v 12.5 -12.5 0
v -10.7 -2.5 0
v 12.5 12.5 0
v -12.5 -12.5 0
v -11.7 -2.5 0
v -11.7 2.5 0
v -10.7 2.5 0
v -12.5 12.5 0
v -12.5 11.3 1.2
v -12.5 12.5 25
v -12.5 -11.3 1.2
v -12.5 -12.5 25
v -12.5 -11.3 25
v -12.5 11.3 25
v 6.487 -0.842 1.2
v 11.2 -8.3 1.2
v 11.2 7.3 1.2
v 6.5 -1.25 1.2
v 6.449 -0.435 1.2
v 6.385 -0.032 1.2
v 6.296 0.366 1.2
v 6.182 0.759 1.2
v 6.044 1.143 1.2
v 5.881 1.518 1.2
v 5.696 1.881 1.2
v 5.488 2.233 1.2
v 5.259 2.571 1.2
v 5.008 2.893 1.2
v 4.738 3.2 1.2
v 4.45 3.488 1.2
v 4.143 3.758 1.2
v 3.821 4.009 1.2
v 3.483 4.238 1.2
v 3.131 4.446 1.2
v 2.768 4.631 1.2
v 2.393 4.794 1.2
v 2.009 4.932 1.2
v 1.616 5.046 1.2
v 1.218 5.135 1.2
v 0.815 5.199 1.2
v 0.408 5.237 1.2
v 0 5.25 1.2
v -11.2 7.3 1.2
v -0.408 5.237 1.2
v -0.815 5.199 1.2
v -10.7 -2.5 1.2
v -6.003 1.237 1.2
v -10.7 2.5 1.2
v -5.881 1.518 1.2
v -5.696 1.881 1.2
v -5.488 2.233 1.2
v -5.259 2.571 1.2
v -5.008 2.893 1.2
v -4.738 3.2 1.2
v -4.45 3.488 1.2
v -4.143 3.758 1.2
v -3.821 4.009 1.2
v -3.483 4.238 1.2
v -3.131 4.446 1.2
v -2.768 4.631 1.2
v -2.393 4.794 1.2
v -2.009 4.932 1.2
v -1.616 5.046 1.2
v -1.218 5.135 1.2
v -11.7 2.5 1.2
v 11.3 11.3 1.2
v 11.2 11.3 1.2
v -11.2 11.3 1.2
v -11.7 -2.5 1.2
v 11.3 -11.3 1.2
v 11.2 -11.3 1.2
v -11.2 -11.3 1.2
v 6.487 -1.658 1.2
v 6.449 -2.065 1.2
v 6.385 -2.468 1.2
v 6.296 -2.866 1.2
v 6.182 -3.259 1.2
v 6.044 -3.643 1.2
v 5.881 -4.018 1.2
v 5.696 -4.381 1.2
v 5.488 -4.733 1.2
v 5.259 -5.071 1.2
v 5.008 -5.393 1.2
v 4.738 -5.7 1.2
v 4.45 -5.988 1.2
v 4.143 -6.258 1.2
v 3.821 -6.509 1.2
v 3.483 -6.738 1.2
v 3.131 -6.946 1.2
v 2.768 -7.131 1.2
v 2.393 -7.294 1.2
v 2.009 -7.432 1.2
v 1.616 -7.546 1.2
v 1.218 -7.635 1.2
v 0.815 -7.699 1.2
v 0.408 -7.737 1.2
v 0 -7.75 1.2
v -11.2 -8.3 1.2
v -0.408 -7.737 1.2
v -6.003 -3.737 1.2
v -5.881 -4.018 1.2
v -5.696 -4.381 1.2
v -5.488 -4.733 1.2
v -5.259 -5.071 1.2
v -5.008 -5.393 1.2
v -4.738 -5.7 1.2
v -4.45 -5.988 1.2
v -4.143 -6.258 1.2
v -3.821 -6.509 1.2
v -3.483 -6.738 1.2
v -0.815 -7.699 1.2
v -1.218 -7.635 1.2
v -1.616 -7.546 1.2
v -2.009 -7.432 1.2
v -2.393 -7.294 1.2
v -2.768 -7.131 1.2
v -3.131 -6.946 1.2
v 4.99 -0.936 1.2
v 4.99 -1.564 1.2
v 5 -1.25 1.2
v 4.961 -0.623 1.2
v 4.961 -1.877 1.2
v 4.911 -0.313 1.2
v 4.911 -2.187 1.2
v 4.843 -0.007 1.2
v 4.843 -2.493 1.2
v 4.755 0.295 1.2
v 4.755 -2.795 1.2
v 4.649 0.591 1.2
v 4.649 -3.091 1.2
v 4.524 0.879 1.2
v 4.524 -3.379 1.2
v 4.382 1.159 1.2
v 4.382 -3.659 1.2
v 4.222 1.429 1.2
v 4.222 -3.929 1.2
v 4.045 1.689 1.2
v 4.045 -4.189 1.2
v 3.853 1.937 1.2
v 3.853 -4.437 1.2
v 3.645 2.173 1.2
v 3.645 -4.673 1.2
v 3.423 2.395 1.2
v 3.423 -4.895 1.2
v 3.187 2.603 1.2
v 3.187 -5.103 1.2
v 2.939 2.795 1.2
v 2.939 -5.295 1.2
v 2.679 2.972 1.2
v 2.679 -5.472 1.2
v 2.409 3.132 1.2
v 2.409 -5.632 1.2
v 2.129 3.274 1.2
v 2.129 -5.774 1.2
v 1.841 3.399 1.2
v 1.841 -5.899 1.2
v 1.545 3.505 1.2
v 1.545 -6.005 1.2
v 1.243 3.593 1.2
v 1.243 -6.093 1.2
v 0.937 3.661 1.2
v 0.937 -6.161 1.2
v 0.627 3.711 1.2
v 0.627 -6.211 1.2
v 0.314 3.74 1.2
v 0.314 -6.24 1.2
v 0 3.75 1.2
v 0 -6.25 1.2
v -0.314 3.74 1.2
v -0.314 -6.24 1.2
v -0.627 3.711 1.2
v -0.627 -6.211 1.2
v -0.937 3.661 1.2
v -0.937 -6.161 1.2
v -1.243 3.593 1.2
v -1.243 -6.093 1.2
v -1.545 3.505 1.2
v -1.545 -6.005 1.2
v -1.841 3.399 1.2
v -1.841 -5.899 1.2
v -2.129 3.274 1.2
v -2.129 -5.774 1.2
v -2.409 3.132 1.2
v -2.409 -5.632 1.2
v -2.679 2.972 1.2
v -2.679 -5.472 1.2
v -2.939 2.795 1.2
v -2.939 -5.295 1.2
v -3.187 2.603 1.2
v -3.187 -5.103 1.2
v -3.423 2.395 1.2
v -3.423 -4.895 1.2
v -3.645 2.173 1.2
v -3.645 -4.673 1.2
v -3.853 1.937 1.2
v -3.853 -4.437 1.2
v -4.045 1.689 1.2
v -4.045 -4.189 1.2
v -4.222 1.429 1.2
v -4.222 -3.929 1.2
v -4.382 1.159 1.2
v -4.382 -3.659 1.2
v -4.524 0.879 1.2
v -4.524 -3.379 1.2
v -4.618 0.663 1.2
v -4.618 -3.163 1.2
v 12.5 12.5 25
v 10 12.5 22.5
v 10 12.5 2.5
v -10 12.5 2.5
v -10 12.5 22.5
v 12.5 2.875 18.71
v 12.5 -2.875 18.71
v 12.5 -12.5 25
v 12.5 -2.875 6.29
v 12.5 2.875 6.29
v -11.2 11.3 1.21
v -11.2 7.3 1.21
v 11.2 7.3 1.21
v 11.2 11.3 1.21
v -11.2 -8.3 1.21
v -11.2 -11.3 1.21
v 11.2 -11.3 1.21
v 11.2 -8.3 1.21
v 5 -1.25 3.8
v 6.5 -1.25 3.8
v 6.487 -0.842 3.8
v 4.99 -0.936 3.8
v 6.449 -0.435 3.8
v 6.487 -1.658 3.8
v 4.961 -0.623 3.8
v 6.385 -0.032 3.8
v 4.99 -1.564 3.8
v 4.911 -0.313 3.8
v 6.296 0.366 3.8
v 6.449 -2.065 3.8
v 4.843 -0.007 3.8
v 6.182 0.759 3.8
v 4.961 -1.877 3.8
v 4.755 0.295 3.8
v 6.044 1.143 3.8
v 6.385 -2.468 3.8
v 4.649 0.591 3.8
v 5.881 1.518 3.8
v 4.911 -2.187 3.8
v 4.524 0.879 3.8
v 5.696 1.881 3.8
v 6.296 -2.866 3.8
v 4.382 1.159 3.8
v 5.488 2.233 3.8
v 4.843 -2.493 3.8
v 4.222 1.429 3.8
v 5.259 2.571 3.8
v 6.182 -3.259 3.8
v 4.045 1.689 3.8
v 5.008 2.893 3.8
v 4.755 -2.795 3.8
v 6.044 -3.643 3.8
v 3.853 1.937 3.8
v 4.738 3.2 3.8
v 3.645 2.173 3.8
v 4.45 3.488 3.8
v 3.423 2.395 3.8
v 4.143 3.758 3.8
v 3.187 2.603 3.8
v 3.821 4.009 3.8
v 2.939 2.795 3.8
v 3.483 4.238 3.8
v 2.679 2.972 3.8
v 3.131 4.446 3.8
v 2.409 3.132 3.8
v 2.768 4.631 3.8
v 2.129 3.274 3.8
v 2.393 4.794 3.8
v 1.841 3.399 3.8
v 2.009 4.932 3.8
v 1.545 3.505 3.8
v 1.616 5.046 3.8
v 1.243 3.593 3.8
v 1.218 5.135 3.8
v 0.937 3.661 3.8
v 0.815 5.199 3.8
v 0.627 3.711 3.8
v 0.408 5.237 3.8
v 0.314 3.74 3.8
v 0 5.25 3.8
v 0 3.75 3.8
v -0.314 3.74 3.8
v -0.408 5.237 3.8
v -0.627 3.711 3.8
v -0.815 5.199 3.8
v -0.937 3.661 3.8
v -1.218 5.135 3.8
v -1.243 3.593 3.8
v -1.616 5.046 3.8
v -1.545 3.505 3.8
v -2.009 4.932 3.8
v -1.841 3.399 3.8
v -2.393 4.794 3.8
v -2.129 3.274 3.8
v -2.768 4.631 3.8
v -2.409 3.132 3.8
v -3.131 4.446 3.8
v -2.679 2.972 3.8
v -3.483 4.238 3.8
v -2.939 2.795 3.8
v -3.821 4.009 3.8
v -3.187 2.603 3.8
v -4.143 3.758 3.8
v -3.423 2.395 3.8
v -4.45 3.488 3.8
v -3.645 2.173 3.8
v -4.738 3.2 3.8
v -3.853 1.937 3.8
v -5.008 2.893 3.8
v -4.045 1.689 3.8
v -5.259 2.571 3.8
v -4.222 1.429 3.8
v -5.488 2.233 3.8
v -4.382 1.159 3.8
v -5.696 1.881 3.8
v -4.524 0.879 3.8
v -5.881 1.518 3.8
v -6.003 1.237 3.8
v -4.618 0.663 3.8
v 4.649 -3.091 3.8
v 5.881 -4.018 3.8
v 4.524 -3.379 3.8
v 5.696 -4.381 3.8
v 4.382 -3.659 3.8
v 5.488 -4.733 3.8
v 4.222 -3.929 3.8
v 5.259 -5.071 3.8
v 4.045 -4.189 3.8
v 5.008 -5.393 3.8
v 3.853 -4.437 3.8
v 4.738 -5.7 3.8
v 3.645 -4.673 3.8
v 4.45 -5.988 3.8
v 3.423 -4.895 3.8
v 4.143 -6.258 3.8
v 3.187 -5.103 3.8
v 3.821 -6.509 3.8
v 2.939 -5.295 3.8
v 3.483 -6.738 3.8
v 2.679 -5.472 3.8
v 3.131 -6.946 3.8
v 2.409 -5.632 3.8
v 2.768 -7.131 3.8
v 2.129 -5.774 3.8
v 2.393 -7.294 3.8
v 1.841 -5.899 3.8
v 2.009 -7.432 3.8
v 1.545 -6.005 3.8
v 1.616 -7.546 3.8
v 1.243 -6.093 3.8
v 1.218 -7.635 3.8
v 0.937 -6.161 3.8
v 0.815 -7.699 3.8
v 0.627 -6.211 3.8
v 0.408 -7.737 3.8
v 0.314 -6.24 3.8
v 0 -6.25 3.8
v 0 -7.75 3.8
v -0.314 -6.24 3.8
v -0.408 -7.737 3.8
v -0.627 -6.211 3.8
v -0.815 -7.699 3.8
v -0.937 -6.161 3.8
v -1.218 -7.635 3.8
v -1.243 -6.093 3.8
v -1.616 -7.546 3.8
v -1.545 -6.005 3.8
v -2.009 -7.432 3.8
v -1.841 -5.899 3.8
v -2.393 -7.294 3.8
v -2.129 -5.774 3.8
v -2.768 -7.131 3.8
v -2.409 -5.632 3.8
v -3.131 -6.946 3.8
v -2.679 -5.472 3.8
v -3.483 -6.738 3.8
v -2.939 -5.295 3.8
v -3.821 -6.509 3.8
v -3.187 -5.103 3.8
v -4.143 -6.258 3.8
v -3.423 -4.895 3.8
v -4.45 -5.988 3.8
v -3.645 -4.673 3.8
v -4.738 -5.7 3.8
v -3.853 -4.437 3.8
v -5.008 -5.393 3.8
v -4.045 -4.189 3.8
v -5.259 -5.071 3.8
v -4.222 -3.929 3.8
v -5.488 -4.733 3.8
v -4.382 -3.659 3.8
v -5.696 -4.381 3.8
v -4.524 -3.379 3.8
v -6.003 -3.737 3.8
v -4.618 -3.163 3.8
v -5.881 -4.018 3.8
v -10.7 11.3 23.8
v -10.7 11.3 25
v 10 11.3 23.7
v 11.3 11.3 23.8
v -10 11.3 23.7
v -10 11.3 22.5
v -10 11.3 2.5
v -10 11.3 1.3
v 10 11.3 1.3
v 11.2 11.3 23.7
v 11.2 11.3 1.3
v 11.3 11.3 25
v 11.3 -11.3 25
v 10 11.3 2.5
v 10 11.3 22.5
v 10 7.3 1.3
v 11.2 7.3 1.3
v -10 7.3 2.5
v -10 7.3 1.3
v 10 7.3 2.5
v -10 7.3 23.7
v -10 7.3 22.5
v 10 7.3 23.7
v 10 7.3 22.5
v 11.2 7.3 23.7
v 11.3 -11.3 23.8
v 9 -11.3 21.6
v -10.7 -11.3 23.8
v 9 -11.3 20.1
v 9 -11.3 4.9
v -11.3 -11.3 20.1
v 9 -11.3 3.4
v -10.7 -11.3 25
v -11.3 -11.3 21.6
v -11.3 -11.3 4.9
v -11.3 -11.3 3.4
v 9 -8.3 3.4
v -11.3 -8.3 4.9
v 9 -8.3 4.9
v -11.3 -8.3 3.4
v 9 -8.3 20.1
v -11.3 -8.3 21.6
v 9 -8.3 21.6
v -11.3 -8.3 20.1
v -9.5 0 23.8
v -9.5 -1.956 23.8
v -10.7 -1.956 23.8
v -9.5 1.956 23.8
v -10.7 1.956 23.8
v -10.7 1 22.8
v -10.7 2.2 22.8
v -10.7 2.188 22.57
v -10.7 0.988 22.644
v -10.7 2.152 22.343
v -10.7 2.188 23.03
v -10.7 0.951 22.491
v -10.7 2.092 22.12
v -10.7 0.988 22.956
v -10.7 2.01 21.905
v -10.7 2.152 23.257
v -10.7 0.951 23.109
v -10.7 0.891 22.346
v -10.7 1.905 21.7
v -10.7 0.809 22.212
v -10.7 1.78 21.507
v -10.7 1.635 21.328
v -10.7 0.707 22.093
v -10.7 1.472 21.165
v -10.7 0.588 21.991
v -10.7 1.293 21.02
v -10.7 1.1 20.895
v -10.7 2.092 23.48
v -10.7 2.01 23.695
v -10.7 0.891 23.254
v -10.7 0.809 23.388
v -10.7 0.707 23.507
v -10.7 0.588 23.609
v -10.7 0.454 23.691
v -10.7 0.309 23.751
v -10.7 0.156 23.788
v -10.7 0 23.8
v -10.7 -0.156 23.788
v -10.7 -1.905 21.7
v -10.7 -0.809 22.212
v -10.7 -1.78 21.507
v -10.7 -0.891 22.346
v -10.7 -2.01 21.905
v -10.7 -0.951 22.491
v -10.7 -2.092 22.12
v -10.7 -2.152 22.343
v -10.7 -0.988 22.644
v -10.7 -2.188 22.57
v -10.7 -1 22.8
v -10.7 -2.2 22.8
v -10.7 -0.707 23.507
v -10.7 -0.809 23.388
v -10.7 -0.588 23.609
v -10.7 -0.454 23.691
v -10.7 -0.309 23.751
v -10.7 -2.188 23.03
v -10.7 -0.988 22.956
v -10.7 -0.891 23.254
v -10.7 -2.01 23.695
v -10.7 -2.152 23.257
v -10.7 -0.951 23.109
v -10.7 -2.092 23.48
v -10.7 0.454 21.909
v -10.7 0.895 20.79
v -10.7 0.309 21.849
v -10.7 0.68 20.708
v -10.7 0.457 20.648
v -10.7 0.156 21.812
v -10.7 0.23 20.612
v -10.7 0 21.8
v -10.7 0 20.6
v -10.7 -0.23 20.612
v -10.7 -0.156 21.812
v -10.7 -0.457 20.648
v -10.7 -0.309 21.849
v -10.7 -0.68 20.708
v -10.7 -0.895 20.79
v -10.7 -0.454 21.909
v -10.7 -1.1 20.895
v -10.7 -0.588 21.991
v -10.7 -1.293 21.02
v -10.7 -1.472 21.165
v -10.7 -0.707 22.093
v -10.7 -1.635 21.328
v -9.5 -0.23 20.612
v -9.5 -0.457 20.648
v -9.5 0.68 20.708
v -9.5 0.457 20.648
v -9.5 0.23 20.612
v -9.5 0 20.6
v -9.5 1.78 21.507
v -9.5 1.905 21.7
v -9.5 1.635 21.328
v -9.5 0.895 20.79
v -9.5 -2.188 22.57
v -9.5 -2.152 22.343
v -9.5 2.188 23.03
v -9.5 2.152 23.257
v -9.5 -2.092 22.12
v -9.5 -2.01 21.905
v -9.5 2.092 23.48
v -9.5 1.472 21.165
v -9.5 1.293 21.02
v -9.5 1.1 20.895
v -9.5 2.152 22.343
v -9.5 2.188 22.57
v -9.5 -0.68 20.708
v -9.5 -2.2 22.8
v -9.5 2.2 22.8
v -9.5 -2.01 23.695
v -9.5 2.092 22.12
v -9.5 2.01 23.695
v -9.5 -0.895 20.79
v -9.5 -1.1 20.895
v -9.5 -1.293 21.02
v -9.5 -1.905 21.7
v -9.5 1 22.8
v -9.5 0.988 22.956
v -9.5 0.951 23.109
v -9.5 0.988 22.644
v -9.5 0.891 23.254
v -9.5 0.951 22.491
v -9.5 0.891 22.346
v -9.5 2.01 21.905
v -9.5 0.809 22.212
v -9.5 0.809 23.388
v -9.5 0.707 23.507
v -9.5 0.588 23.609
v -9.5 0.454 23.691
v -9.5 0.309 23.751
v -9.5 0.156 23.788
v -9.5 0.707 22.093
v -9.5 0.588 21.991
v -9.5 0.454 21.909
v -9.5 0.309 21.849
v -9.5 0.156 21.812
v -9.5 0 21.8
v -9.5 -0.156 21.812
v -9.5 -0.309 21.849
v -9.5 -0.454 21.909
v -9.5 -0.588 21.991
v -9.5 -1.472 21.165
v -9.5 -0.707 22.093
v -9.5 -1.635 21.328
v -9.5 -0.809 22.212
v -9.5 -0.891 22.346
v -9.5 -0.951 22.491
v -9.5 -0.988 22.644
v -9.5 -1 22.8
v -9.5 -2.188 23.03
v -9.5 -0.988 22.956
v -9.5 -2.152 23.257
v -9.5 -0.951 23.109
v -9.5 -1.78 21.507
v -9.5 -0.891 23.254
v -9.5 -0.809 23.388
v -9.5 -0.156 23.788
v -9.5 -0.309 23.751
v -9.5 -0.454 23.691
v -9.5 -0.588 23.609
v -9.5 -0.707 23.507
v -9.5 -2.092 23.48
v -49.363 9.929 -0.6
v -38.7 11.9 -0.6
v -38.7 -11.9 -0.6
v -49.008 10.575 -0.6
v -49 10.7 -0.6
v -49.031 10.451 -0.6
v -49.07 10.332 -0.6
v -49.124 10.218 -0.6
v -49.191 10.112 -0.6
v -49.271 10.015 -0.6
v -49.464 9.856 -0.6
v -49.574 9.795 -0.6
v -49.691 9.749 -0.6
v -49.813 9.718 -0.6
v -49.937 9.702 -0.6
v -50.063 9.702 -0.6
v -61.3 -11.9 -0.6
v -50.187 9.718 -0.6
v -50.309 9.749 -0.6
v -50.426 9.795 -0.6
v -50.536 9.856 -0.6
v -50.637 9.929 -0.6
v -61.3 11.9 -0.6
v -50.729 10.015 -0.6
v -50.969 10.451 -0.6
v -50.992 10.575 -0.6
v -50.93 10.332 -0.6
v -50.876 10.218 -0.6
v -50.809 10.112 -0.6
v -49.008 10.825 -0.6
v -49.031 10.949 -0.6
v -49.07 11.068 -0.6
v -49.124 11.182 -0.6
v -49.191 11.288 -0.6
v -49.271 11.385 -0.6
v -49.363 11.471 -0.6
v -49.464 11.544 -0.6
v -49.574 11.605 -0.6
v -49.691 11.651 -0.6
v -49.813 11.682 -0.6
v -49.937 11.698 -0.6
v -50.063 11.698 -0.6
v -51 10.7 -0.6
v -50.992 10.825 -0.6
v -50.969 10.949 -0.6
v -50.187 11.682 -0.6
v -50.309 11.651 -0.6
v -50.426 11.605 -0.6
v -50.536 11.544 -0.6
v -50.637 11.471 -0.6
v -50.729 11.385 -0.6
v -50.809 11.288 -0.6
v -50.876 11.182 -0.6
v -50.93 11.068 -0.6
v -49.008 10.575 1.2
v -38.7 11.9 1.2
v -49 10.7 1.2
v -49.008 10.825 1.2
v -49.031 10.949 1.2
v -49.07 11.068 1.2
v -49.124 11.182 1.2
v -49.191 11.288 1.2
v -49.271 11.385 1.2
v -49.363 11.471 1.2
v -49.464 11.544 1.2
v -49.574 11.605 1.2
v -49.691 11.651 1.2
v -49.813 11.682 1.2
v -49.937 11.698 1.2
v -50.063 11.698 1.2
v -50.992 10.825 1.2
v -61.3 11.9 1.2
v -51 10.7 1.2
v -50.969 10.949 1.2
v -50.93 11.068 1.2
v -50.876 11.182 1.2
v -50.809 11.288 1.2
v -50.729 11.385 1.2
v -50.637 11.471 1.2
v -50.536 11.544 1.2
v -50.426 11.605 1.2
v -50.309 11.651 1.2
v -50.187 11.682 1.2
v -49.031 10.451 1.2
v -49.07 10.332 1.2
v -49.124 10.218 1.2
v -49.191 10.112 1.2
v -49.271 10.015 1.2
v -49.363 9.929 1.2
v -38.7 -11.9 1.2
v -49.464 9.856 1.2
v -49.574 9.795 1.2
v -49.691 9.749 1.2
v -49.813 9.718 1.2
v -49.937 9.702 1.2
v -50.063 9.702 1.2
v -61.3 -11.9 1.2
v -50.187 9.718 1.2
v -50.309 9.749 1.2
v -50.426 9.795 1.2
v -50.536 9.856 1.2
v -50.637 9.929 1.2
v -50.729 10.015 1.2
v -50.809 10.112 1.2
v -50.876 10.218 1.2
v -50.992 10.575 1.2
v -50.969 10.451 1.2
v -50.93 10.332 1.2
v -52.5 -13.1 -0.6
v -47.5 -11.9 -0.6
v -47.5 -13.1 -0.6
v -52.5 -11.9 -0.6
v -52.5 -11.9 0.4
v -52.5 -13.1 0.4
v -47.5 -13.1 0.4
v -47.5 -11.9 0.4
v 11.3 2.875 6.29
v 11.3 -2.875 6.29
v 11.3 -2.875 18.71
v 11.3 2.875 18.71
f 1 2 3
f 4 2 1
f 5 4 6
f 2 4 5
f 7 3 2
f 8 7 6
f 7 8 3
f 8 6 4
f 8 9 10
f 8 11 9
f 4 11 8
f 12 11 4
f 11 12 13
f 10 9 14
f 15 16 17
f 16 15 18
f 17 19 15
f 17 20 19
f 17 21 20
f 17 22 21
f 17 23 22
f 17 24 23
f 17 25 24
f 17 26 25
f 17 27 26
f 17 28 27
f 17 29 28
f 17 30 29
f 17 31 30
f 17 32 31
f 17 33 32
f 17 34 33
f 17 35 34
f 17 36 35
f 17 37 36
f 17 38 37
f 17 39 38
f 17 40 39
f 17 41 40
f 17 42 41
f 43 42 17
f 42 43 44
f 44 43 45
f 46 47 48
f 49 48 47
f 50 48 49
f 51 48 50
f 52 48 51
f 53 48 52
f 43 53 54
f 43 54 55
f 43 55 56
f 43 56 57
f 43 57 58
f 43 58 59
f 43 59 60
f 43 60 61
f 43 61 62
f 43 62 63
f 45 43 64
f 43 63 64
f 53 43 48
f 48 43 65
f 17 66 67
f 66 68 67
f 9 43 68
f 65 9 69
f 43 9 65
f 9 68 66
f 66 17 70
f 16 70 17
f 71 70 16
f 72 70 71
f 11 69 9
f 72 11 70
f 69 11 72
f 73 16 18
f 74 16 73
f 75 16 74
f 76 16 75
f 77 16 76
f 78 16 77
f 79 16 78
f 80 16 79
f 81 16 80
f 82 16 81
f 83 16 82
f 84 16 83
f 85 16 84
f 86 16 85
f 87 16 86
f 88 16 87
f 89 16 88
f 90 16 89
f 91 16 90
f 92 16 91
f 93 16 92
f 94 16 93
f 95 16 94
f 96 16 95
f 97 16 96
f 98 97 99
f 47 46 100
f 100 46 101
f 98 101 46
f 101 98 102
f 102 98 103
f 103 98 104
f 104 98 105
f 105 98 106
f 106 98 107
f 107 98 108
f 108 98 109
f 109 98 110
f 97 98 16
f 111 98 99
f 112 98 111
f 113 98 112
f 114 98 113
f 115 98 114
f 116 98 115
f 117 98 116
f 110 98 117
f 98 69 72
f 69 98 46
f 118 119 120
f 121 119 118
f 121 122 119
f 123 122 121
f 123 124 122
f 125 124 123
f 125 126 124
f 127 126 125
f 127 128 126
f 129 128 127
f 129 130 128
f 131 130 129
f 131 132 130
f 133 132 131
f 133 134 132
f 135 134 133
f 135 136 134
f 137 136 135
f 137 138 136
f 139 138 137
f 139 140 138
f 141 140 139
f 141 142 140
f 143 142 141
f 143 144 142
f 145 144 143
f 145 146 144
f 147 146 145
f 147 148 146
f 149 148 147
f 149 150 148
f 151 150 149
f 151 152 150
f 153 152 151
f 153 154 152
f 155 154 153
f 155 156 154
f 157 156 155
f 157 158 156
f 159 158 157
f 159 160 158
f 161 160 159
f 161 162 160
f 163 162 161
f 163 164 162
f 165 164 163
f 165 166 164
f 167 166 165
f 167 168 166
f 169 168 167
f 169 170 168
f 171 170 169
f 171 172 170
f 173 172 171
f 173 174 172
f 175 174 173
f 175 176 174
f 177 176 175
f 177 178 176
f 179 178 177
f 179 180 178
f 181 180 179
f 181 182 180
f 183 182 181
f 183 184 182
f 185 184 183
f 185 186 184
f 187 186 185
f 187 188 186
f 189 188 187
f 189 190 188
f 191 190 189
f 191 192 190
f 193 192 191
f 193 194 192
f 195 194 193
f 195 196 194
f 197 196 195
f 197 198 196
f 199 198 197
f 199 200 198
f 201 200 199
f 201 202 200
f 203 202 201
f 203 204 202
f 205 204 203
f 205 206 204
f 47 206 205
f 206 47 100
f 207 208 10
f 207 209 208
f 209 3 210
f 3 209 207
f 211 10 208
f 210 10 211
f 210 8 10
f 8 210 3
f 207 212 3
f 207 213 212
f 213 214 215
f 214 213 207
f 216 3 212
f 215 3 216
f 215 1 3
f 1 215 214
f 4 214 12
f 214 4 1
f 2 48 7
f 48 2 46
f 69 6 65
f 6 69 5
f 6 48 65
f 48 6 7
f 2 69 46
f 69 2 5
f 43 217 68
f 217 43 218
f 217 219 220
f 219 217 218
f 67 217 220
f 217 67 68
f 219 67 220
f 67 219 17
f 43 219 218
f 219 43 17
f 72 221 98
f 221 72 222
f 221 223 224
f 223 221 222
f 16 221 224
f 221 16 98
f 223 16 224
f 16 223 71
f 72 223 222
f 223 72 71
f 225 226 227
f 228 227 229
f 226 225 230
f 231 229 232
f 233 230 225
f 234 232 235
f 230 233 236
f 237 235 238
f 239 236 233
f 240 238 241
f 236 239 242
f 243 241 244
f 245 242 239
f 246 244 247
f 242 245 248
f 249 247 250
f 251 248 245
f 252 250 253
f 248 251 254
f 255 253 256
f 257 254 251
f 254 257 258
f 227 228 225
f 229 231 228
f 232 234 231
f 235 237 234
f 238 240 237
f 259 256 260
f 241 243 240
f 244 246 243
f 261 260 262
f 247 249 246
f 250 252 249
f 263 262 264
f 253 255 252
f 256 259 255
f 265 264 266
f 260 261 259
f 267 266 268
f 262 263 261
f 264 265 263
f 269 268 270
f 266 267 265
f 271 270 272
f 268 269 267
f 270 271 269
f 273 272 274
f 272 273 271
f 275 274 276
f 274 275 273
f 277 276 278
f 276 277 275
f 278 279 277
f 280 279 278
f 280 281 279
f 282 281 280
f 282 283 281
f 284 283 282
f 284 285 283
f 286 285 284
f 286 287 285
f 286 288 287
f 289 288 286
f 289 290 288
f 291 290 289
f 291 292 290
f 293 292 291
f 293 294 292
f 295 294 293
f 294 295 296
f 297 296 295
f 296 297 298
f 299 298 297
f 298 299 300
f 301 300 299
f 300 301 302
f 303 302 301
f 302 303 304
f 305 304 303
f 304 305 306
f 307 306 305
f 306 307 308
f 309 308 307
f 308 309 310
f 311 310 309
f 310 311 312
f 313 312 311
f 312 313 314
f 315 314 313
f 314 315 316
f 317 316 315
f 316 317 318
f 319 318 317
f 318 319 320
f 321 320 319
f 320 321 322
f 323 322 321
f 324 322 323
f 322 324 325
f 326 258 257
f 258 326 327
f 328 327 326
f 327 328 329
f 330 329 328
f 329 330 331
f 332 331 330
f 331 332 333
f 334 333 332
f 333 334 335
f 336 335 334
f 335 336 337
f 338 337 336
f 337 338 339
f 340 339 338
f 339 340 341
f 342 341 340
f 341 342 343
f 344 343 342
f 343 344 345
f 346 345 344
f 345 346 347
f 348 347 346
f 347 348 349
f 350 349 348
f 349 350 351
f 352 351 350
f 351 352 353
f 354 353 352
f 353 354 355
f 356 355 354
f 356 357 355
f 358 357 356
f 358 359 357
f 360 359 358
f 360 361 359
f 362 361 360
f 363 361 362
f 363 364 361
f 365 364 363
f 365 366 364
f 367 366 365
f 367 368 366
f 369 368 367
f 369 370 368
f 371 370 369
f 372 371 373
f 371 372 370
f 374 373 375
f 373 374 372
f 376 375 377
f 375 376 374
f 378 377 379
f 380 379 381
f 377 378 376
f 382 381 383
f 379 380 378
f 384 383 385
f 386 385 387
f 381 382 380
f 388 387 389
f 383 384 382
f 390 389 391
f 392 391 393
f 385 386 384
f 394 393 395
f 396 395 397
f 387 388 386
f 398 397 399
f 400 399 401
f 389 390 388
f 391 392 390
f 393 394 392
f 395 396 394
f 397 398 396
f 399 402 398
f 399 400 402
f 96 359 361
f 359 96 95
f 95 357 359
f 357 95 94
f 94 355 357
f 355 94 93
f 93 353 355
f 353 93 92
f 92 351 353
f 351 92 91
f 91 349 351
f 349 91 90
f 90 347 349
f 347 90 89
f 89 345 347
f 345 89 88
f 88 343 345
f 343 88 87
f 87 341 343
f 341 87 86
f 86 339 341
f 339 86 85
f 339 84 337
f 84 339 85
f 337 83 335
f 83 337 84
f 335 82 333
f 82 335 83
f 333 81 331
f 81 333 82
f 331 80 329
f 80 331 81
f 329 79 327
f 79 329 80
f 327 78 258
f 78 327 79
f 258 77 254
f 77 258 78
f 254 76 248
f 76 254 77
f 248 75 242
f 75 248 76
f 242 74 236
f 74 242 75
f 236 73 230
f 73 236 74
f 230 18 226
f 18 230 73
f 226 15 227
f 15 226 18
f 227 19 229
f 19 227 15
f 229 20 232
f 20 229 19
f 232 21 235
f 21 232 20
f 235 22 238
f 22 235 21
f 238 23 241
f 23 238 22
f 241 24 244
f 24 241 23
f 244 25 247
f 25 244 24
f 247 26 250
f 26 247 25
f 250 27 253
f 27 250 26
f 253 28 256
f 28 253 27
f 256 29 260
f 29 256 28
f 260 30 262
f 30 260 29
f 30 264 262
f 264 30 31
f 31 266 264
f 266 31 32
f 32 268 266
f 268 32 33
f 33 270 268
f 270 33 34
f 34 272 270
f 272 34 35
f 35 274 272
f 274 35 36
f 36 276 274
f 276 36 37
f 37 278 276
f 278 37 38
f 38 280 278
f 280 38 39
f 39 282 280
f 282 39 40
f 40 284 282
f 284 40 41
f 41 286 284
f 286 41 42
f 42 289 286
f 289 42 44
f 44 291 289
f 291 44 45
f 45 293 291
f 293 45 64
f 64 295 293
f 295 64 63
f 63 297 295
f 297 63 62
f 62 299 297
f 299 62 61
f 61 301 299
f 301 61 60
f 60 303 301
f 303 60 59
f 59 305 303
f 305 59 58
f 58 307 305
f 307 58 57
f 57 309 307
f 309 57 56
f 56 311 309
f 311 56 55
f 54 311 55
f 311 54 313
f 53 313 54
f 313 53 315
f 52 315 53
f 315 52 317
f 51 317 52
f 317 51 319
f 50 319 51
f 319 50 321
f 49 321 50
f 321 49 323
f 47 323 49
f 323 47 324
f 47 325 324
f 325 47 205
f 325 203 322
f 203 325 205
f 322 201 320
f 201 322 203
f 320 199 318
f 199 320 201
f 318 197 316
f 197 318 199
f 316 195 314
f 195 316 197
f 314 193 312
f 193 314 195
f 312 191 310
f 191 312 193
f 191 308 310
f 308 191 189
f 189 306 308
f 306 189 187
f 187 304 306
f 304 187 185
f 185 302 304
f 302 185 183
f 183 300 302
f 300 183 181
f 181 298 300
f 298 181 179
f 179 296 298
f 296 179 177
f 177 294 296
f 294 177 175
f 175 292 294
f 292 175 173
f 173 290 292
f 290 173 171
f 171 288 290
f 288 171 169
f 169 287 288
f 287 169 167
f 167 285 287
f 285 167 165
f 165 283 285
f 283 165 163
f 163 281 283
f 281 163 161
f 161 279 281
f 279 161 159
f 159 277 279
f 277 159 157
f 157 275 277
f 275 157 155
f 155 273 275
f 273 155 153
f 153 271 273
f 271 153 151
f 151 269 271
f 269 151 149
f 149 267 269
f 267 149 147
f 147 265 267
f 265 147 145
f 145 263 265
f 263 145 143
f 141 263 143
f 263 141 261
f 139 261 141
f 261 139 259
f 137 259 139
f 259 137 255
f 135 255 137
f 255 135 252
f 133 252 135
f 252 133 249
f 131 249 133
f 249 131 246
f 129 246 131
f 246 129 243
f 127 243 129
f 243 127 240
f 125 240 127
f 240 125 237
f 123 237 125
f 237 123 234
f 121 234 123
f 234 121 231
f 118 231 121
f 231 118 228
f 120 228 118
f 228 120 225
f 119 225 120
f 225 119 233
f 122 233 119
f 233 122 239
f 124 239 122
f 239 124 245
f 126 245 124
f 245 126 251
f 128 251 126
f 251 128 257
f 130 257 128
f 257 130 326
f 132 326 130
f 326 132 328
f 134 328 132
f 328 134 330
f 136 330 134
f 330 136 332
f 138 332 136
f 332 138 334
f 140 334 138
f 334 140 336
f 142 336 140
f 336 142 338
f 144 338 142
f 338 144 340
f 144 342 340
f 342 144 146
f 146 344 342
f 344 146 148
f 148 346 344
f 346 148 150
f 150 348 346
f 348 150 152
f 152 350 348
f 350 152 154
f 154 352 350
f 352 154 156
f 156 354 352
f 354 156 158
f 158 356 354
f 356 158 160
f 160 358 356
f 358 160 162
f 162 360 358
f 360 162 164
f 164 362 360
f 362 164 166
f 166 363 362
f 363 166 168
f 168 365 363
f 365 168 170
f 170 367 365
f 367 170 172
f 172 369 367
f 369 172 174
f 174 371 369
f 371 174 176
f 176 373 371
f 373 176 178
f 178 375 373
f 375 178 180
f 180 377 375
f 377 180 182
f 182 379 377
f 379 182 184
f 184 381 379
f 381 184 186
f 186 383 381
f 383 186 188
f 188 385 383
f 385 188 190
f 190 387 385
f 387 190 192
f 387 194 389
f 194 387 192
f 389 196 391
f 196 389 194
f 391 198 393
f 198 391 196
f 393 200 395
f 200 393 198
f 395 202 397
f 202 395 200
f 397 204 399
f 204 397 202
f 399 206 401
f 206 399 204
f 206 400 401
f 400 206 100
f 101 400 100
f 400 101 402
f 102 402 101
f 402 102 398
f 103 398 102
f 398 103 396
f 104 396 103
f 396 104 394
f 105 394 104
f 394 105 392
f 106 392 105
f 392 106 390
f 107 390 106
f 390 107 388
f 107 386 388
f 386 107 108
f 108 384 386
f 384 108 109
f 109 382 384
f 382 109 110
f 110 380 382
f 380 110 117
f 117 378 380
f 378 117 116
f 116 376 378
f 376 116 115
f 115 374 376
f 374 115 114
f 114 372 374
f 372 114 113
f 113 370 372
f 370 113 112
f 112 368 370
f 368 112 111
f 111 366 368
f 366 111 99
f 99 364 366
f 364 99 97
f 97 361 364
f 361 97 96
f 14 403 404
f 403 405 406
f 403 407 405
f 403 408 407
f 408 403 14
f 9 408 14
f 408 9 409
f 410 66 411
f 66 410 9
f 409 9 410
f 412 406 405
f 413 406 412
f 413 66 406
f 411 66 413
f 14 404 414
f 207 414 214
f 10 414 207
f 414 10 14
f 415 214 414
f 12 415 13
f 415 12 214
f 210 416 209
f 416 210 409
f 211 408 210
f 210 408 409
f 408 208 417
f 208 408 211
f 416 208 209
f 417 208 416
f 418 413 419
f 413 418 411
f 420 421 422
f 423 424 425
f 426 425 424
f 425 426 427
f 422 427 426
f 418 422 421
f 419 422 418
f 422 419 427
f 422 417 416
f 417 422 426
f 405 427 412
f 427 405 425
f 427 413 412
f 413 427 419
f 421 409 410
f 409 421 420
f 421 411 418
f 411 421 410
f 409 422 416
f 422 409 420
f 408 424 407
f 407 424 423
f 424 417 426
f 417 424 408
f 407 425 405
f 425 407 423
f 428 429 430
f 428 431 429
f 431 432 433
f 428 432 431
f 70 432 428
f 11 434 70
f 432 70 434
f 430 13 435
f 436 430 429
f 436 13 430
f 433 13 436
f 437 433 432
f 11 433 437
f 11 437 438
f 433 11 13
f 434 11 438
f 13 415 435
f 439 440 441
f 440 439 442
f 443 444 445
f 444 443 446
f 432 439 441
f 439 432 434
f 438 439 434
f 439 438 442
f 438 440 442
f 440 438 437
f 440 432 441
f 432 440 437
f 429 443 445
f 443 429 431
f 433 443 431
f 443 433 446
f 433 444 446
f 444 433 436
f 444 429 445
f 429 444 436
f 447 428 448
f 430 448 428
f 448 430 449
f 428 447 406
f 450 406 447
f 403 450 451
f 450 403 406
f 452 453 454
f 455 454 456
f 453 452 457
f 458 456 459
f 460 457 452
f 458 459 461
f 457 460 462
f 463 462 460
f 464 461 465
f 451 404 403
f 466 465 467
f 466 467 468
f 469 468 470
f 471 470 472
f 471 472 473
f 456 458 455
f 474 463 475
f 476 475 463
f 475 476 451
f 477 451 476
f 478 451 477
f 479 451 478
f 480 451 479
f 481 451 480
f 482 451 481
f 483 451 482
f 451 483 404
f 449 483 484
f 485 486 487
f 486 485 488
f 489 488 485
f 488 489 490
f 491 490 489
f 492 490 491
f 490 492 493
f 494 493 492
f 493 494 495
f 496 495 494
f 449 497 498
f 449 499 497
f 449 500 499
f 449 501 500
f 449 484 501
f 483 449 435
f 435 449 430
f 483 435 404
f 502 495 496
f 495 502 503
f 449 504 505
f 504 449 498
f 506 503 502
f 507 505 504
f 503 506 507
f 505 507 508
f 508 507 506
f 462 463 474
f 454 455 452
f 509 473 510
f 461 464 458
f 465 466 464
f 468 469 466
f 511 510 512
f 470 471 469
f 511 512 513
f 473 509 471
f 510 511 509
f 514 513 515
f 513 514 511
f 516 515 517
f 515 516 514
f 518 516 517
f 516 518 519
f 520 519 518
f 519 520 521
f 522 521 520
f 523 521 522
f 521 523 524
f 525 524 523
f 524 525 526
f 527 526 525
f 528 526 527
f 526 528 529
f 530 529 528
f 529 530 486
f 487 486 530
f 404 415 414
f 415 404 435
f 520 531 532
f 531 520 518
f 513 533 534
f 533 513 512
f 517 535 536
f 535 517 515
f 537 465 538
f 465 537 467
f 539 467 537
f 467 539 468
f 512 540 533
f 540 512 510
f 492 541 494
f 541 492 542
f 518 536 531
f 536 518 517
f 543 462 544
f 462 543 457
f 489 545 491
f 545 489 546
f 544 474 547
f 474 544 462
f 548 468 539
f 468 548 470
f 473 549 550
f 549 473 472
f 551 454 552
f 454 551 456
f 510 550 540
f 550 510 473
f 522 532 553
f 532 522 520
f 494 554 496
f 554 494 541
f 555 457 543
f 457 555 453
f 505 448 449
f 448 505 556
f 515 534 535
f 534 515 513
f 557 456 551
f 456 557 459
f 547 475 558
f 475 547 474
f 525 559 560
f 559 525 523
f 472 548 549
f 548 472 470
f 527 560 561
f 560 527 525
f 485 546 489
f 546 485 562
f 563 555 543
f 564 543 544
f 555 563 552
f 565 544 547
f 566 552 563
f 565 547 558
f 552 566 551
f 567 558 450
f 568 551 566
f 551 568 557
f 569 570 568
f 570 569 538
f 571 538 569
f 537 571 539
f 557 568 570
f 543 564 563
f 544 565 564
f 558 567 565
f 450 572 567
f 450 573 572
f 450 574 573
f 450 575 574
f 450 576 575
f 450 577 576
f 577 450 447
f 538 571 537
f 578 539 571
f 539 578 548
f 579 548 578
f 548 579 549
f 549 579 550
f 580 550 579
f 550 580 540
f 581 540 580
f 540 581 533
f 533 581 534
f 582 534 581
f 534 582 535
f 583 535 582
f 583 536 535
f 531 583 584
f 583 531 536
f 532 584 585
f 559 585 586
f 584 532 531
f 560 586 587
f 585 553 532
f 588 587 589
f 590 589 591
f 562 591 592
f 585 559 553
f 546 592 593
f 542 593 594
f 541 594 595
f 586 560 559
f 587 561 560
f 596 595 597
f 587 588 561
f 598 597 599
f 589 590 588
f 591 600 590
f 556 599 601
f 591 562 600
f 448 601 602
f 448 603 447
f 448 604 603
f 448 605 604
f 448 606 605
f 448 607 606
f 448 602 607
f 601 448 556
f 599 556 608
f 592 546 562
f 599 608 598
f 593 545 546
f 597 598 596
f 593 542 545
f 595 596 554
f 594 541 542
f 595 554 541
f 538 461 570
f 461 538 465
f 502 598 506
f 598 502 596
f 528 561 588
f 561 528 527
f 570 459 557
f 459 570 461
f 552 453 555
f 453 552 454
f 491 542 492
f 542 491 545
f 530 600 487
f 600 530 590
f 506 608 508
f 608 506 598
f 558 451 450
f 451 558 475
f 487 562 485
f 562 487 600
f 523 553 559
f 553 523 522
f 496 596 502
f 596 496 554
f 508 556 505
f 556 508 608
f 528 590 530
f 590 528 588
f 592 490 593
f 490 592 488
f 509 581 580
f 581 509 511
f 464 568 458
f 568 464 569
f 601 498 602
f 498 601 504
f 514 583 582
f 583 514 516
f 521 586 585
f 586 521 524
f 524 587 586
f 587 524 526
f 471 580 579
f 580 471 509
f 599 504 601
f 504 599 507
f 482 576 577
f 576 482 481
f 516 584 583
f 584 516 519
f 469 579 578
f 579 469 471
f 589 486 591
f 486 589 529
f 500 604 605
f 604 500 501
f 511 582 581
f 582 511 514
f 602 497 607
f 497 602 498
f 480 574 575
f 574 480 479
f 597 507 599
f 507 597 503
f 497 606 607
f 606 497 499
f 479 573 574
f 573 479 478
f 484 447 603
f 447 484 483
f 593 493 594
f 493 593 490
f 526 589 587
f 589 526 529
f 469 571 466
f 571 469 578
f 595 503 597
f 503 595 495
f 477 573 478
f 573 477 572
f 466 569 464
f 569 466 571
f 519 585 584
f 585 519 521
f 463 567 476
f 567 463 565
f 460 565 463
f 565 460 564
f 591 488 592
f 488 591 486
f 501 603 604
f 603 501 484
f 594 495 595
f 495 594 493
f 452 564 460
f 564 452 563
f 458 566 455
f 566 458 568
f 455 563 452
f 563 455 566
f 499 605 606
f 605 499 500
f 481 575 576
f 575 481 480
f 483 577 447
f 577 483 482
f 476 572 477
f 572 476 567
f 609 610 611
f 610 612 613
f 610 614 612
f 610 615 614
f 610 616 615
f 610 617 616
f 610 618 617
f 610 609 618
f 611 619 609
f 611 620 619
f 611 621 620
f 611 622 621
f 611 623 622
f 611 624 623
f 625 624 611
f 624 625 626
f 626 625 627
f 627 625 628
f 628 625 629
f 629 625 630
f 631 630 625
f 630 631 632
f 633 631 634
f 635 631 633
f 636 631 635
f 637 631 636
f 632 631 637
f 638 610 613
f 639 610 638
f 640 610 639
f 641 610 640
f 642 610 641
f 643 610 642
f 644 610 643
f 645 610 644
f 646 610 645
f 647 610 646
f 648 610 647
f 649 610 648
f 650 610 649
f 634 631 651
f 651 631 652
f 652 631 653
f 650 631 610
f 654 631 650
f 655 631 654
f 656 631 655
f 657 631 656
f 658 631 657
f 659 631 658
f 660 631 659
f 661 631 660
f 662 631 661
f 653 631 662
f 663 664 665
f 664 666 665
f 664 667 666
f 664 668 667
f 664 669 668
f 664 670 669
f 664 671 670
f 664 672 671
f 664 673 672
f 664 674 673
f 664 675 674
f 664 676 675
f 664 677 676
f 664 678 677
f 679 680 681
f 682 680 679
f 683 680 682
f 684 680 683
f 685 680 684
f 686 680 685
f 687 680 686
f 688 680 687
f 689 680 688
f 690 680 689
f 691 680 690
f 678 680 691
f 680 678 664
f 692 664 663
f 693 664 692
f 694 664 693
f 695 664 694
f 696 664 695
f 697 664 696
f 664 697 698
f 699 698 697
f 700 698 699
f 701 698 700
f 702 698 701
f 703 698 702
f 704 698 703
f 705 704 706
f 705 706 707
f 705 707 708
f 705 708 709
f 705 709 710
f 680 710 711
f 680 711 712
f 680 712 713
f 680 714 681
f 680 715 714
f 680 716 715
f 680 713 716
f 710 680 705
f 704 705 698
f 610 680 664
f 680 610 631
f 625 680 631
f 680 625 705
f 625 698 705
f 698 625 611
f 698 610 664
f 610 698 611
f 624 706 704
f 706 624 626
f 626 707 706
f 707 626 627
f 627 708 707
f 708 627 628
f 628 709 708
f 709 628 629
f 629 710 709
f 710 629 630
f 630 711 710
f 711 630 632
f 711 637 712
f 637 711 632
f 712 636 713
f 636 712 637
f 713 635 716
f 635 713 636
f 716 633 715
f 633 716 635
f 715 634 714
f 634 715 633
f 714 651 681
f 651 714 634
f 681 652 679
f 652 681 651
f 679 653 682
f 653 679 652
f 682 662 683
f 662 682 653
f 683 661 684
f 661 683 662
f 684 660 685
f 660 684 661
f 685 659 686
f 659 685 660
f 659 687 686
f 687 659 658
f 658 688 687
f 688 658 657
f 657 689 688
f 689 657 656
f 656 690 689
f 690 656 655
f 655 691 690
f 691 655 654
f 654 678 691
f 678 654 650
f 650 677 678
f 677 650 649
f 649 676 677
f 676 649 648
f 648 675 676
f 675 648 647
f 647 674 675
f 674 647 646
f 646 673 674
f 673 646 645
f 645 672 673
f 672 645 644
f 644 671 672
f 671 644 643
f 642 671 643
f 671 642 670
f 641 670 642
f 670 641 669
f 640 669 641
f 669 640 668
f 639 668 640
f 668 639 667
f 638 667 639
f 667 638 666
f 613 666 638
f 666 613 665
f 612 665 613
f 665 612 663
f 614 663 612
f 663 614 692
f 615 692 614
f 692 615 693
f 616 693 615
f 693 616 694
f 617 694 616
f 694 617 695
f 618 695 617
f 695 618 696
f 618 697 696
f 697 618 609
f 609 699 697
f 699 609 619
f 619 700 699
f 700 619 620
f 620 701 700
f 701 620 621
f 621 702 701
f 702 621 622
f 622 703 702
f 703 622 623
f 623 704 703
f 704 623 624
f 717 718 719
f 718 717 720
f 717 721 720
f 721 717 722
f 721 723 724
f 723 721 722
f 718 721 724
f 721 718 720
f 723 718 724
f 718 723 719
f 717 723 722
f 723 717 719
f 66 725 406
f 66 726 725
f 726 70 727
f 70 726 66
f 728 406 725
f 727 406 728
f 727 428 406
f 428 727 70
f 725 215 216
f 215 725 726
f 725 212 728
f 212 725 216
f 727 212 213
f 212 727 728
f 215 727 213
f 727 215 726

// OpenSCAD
// ============================================================
// 하우징 조립 - ERM 면 + Peltier 면
// ERM 면: 바닥 (XY 평면, world Z=0)
// Peltier 면: ERM 면의 +Y쪽 가장자리에서 수직으로 세움.
//   Peltier 면의 로컬 Y축(위<->아래) -> world Z축(위<->아래)
//   Peltier 면의 로컬 Z축(브라켓 돌출) -> world -Y축(하우징 안쪽으로 돌출)
// ============================================================

// ---------------- ERM 면 ----------------
module erm_face() {
    face_size      = 25;   // 면의 가로/세로 (정사각형)
    housing_t      = 1.2;  // 하우징 두께 (사방 테두리)
    border_gap     = 0.1;  // 테두리 안쪽 빈 공간 (Peltier 쪽 면과 동일한 규칙 적용)
    peltier_t      = 4;    // Peltier 고정 두께 (Z 깊이는 Peltier 면에서 결정)
    gap_1          = 2.05; // 빈 공간 (peltier_t 5.5->4 축소로 생긴 1.5mm를 ERM 링과 가까운 이 gap에 보충)
    erm_ring_t     = 1.5;  // ERM 고정 두께 (링 벽 두께)
    erm_hole_d     = 10;   // ERM 부품이 들어갈 원형 공간 지름
    gap_2          = 0.55; // 빈 공간 (ERM 링 두께 축소로 생긴 1mm 중 0.5mm 보충)
    motor_driver_t = 3;    // 모터 드라이버 고정 두께 (Z 깊이는 다른 면 설계 시 결정)

    erm_ring_z     = 2.6;  // ERM 고정 두께의 Z방향 깊이 (확정값)
    guide_h        = 0.01; // 참고용 2D 레이아웃 표시용 얇은 두께

    // --- Y축 경계 계산 (중심 원점, 위 -> 아래) ---
    y_top    = face_size / 2;
    y1 = y_top - housing_t;   // peltier 밴드 상단
    y2 = y1 - peltier_t;      // gap_1 상단
    y3 = y2 - gap_1;          // erm 링 위쪽 벽 상단
    y4 = y3 - erm_ring_t;     // erm 구멍 상단
    y5 = y4 - erm_hole_d;     // erm 구멍 하단 / 링 아래쪽 벽 상단
    y6 = y5 - erm_ring_t;     // gap_2 상단
    y7 = y6 - gap_2;          // 모터 드라이버 밴드 상단
    y8 = y7 - motor_driver_t; // 하우징 아래쪽 테두리 상단
    y_bottom = y8 - housing_t; // 검증용 (-face_size/2 와 같아야 함)

    erm_center_y = (y4 + y5) / 2;
    erm_inner_r  = erm_hole_d / 2;
    erm_outer_r  = erm_inner_r + erm_ring_t;

    frame_inner_w = face_size - 2 * housing_t;
    inner_w       = face_size - 2 * (housing_t + border_gap);

    echo("[ERM] y_bottom check =", y_bottom, " (should be", -face_size / 2, ")");
    echo("[ERM] ring center_y =", erm_center_y, " inner_r =", erm_inner_r, " outer_r =", erm_outer_r);

    // 하우징 바닥판 (면 전체, 실제 3D, 두께 1.2mm)
    // ERM 링이 뚫린 부분(9시 방향) 쪽, -X 가장자리에서 0.8mm 띄운 지점부터
    // (기존 0.2mm에서 ERM 링쪽으로 0.6mm 추가 이동)
    // 5mm(Y) x 1mm(X) 직사각형을 완전 관통(Z 1.2mm 전체). Y는 8.8mm씩 양쪽에서 띄워 중앙 정렬.
    color("gray")
        difference() {
            linear_extrude(height = housing_t)
                square([face_size, face_size], center = true);
            translate([-face_size / 2 + 0.8, -2.5, 0])
                cube([1, 5, housing_t]);
        }

    // 참고용 2D 레이아웃 (Z 깊이 미정 영역, 바닥판 위에 반투명 표시)
    color("orange", 0.3)
        translate([0, 0, housing_t])
            linear_extrude(height = guide_h)
                translate([0, y1 - peltier_t / 2])
                    square([inner_w, peltier_t], center = true);

    color("cyan", 0.3)
        translate([0, 0, housing_t])
            linear_extrude(height = guide_h)
                translate([0, y7 - motor_driver_t / 2])
                    square([inner_w, motor_driver_t], center = true);

    // ERM 링에서 잘라낼 구간: 9시 방향(180도) 기준 45도
    erm_gap_center_deg = 180;
    erm_gap_width_deg  = 45;
    erm_gap_r          = erm_outer_r + 1; // 확실히 잘리도록 여유

    // ERM 고정 링 (실제 3D, 바닥판 위에 Z 깊이 2.6mm 추가, 9시 방향 45도 절개)
    color("SteelBlue")
        translate([0, erm_center_y, housing_t])
            linear_extrude(height = erm_ring_z)
                difference() {
                    difference() {
                        circle(r = erm_outer_r, $fn = 100);
                        circle(r = erm_inner_r, $fn = 100);
                    }
                    polygon(points = [
                        [0, 0],
                        [erm_gap_r * cos(erm_gap_center_deg - erm_gap_width_deg / 2),
                         erm_gap_r * sin(erm_gap_center_deg - erm_gap_width_deg / 2)],
                        [erm_gap_r * cos(erm_gap_center_deg + erm_gap_width_deg / 2),
                         erm_gap_r * sin(erm_gap_center_deg + erm_gap_width_deg / 2)]
                    ]);
                }
}

// ---------------- Peltier 면 ----------------
module peltier_face() {
    face_size  = 25;   // 면의 가로/세로 (정사각형)
    housing_t  = 1.2;  // 하우징 두께 (사방 테두리)
    border_gap = 0.1;  // 테두리 안쪽 빈 공간 (X방향: 좌우 브라켓/연결부 폭 계산용)
    top_gap    = 1.3;  // 위쪽 테두리 - 브라켓 사이 Y방향 빈 공간 (bracket_h 1.2mm 축소분 보충: 0.1 -> 1.3)

    bracket_w  = 1.2;   // 세로 브라켓(Peltier 고정) 가로 두께
    bracket_h  = 20;    // 세로 브라켓(Peltier 고정) 세로 높이
    open_w     = 20;    // 브라켓 사이 뚫린 공간 가로 폭
    erm_link_h = 1.2;   // ERM 면과 연결되는 부분의 세로 두께 (브라켓과 바로 붙음)
    mid_gap    = 0.1;   // ERM 연결부 - 바깥 하우징 테두리 사이 빈 공간

    bracket_z  = 4;     // Peltier 고정 두께의 Z방향 깊이
    guide_h    = 0.01;  // 참고용 2D 레이아웃 표시용 얇은 두께

    frame_inner_w = face_size - 2 * housing_t;
    inner_w       = face_size - 2 * (housing_t + border_gap);

    // Y축 (위 -> 아래)
    y_top = face_size / 2;
    y1 = y_top - housing_t;
    y2 = y1 - top_gap;
    y3 = y2 - bracket_h;
    y4 = y3 - erm_link_h;
    y5 = y4 - mid_gap;
    y_bottom = y5 - housing_t;

    // X축 (왼쪽 -> 오른쪽)
    x_left = -face_size / 2;
    x1 = x_left + housing_t;
    x2 = x1 + border_gap;
    x3 = x2 + bracket_w;
    x4 = x3 + open_w;
    x5 = x4 + bracket_w;
    x_right_check = x5 + border_gap + housing_t;

    bracket_center_y = (y2 + y3) / 2;
    left_bracket_center_x  = (x2 + x3) / 2;
    right_bracket_center_x = (x4 + x5) / 2;

    echo("[Peltier] y_bottom check =", y_bottom, " (should be", -face_size / 2, ")");
    echo("[Peltier] x_right check =", x_right_check, " (should be", face_size / 2, ")");

    // 하우징 바닥판 (면 전체, 실제 3D, 두께 1.2mm)
    // 브라켓 자리(20mm x 20mm)를 관통 구멍으로 뚫음
    color("gray")
        difference() {
            linear_extrude(height = housing_t)
                square([face_size, face_size], center = true);
            translate([0, bracket_center_y, -0.1])
                linear_extrude(height = housing_t + 0.2)
                    square([open_w, bracket_h], center = true);
        }

    // ERM 연결부 (실제 3D, 바닥판 위에 Z 깊이 4mm 추가)
    color("green")
        translate([0, 0, housing_t])
            linear_extrude(height = bracket_z)
                translate([0, y3 - erm_link_h / 2])
                    square([inner_w, erm_link_h], center = true);

    // Peltier 고정 브라켓 (실제 3D, 바닥판 위에 Z 깊이 4mm 추가)
    color("SteelBlue")
        translate([0, 0, housing_t])
            linear_extrude(height = bracket_z) {
                translate([left_bracket_center_x, bracket_center_y])
                    square([bracket_w, bracket_h], center = true);
                translate([right_bracket_center_x, bracket_center_y])
                    square([bracket_w, bracket_h], center = true);
            }
}

// ---------------- 오른쪽(3시 방향) 면 ----------------
// 다른 부품 없이 1.2mm 두께 벽에 정가운데 직사각형 구멍만 있는 단순한 면.
module right_face() {
    face_size = 25;    // 면의 가로/세로 (정사각형, ERM/Peltier 면과 동일)
    housing_t = 1.2;   // 하우징 두께 (벽 두께)
    hole_w    = 12.42; // 정가운데 구멍 가로
    hole_h    = 5.75;  // 정가운데 구멍 세로

    color("gray")
        linear_extrude(height = housing_t)
            difference() {
                square([face_size, face_size], center = true);
                square([hole_w, hole_h], center = true);
            }
}

// ---------------- 모터 드라이버 쪽 면 ----------------
module motor_driver_face() {
    face_size = 25;   // 면의 가로/세로 (정사각형)
    housing_t = 1.2;  // 하우징 두께 (사방 테두리)

    gap_y     = 2.3;   // 위쪽 하우징 테두리 - 브라켓 사이 빈 공간
    bracket_h = 20.3;  // 세로 브라켓(모터 드라이버 고정) 세로 높이
    gap_x     = 2.2;   // 좌우 하우징 테두리 - 브라켓 사이 빈 공간
    bracket_w = 1.5;   // 세로 브라켓(모터 드라이버 고정) 가로 두께
    open_w    = 15.2;  // 브라켓 사이 뚫린 공간 가로 폭

    bracket_z = 3;     // 모터 드라이버 고정 두께의 Z방향 깊이 (ERM 면 스택의 3mm 재사용)

    // Y축 (위 -> 아래)
    y_top = face_size / 2;
    y1 = y_top - housing_t;
    y2 = y1 - gap_y;
    y3 = y2 - bracket_h;       // 브라켓 하단 = 아래쪽 테두리 상단 (ERM 연결)
    y_bottom = y3 - housing_t;

    // X축 (왼쪽 -> 오른쪽)
    x_left = -face_size / 2;
    x1 = x_left + housing_t;
    x2 = x1 + gap_x;
    x3 = x2 + bracket_w;
    x4 = x3 + open_w;
    x5 = x4 + bracket_w;
    x_right_check = x5 + gap_x + housing_t;

    bracket_center_y = (y2 + y3) / 2;
    left_bracket_center_x  = (x2 + x3) / 2;
    right_bracket_center_x = (x4 + x5) / 2;

    echo("[MotorDriver] y_bottom check =", y_bottom, " (should be", -face_size / 2, ")");
    echo("[MotorDriver] x_right check =", x_right_check, " (should be", face_size / 2, ")");

    // 하우징 바닥판 (면 전체, 실제 3D, 두께 1.2mm)
    color("gray")
        linear_extrude(height = housing_t)
            square([face_size, face_size], center = true);

    // 모터 드라이버 고정 브라켓 (실제 3D, 바닥판 위에 Z 깊이 3mm 추가)
    color("purple")
        translate([0, 0, housing_t])
            linear_extrude(height = bracket_z) {
                translate([left_bracket_center_x, bracket_center_y])
                    square([bracket_w, bracket_h], center = true);
                translate([right_bracket_center_x, bracket_center_y])
                    square([bracket_w, bracket_h], center = true);
            }
}

// ---------------- 조립 ----------------
erm_face();

// Peltier 면을 ERM 면의 +Y쪽 가장자리(y=12.5)에 수직으로 세움 (위치는 그대로).
// 면 안의 패턴(브라켓/연결부)만 왼쪽(반시계 방향)으로 90도 회전.
// 로컬 Y -> world Z, 로컬 Z(브라켓 돌출) -> world -Y
translate([0, 12.5, 12.5])
    rotate([90, 0, 0])
        rotate([0, 0, 90])
            peltier_face();

// 오른쪽 면을 ERM 면의 +X쪽 가장자리(x=12.5)에 수직으로 세움.
translate([12.5, 0, 12.5])
    rotate([0, -90, 0])
        right_face();

// 모터 드라이버 면을 ERM 면의 -Y쪽 가장자리(y=-12.5)에 수직으로 세움.
// Peltier 면과 같은 형태의 변환을 쓰고, world Z축 기준 180도 돌려서 반대쪽 가장자리에 배치.
// 면 안의 패턴(브라켓)만 제자리에서 90도 회전.
rotate([0, 0, 180])
    translate([0, 12.5, 12.5])
        rotate([90, 0, 0])
            rotate([0, 0, 90])
                motor_driver_face();

// ---------------- 윗면 ----------------
// 다른 부품 없이 1.2mm 두께 벽만 있는 단순한 면. 박스 맨 위(z=25)를 막음.
// 뚫린 면(-X쪽, 왼쪽) 방향으로 1.2mm 잘라내서 클로저 부품이 들어갈 자리를 남김.
// 클로저 하우징의 나사 구멍(윗면 안쪽 면 기준 Z로 1.2mm 아래)에 맞춰
// 지름 5mm 보스(가장자리에서 안쪽으로 1.5mm) 1개를 가운데에 붙이고, 나사 구멍은
// 클로저 구멍과 같은 방향(X축)으로 지름 2mm 관통.
module top_face() {
    face_size = 25;   // 면의 가로/세로 (정사각형)
    housing_t = 1.2;  // 하우징 두께 (벽 두께)

    boss_d      = 4.4;  // 나사 보스 지름
    boss_depth  = 1.2;  // 나사 보스의 X방향 두께
    boss_x0     = -face_size / 2 + housing_t; // 가장자리(뚫린 부분)에서 안쪽으로 1.2mm 들어간 원래 지점
    boss_shift  = 0.6;   // ERM 면의 직사각형 구멍과 동일하게 0.6mm 안쪽으로 이동
    boss_x      = boss_x0 + boss_shift;
    screw_d     = 2;    // 나사 구멍 지름
    boss_y      = 0;    // 가운데 정렬
    boss_z      = -1.0; // 보스 맨 위(Z) 좌표가 판재 맨 위(z=housing_t=1.2)와 같도록 설정 (-1.0+4.4/2=1.2)

    difference() {
        union() {
            // 판재 자체 길이를 보스 이동분(0.6mm)만큼 더 줄임 (뚫린 가장자리에서 housing_t+boss_shift만큼 후퇴)
            color("gray")
                linear_extrude(height = housing_t)
                    translate([-face_size / 2 + housing_t + boss_shift, -face_size / 2])
                        square([face_size - housing_t - boss_shift, face_size], center = false);

            // 나사 보스 1개 (0.6mm 이동한 지점부터 안쪽으로 1.5mm, 구멍 축은 X방향)
            color("gray")
                translate([boss_x, boss_y, boss_z])
                    rotate([0, 90, 0])
                        cylinder(d = boss_d, h = boss_depth, $fn = 60);
        }

        // 나사 구멍 (X방향 관통, 보스를 지나 벽까지)
        translate([boss_x - 0.1, boss_y, boss_z])
            rotate([0, 90, 0])
                cylinder(d = screw_d, h = boss_depth + housing_t + 0.2, $fn = 40);
    }
}

translate([0, 0, 25 - 1.2])
    top_face();

// ---------------- 클로저 하우징 ----------------
// 뚫린 면(-X쪽)에 들어갈 평판. 조립체에 붙이지 않고 옆으로 떨어뜨려서 배치.
module closure_housing() {
    lid_w = 22.6;  // 평판 가로
    lid_h = 23.8;  // 평판 세로
    lid_t = 1.8;   // 평판 두께 (1.2 -> 1.8, 0.6mm 증가)
    plate_grow = lid_t - 1.2; // 두께 증가분 (0.6mm) - 바깥쪽(outer, z 음의 방향)으로 확장

    hole_d          = 2;   // 구멍 지름
    hole_y_from_top = 1.2; // 윗변 - 구멍 중심 거리 (가장 가까운 면의 모서리와 1.2mm 차이)

    hole_x = 0;                       // 가운데 정렬
    hole_y = lid_h / 2 - hole_y_from_top;

    tab_w    = 5;   // 하단 돌출부 가로
    tab_len  = 1.2; // 하단 돌출부가 평판 아래로 튀어나온 길이
    tab_z    = 1.0; // 돌출부의 Z방향 두께 (평판 바깥쪽 면과 밑면이 딱 맞음, 안쪽으로 0.8mm 단차)

    echo("[Closure] hole_x =", hole_x, " hole_y =", hole_y);

    // 메인 평판 (구멍 1개, 가운데). 안쪽면(z=1.2)은 고정, 바깥쪽면이 0.6mm 더 나감(z=-0.6)
    color("gray")
        translate([0, 0, -plate_grow])
            linear_extrude(height = lid_t)
                difference() {
                    square([lid_w, lid_h], center = true);
                    translate([hole_x, hole_y]) circle(d = hole_d, $fn = 50);
                }

    // 하단 돌출 탭 (평판 아래쪽 가장자리에서 1.2mm 튀어나옴).
    // Z방향으로는 평판 바깥쪽 면(z=-plate_grow)과 밑면이 딱 맞고, 두께는 1mm만
    // (평판 두께 1.8mm 중 안쪽으로 0.8mm는 단차로 비움)
    color("SlateGray")
        translate([0, -lid_h / 2 - tab_len / 2, -plate_grow])
            linear_extrude(height = tab_z)
                square([tab_w, tab_len], center = true);
}

// 조립체와 떨어뜨려서 배치 (뚫린 -X쪽 방향으로 멀리)
translate([-50, 0, 0])
    closure_housing();
